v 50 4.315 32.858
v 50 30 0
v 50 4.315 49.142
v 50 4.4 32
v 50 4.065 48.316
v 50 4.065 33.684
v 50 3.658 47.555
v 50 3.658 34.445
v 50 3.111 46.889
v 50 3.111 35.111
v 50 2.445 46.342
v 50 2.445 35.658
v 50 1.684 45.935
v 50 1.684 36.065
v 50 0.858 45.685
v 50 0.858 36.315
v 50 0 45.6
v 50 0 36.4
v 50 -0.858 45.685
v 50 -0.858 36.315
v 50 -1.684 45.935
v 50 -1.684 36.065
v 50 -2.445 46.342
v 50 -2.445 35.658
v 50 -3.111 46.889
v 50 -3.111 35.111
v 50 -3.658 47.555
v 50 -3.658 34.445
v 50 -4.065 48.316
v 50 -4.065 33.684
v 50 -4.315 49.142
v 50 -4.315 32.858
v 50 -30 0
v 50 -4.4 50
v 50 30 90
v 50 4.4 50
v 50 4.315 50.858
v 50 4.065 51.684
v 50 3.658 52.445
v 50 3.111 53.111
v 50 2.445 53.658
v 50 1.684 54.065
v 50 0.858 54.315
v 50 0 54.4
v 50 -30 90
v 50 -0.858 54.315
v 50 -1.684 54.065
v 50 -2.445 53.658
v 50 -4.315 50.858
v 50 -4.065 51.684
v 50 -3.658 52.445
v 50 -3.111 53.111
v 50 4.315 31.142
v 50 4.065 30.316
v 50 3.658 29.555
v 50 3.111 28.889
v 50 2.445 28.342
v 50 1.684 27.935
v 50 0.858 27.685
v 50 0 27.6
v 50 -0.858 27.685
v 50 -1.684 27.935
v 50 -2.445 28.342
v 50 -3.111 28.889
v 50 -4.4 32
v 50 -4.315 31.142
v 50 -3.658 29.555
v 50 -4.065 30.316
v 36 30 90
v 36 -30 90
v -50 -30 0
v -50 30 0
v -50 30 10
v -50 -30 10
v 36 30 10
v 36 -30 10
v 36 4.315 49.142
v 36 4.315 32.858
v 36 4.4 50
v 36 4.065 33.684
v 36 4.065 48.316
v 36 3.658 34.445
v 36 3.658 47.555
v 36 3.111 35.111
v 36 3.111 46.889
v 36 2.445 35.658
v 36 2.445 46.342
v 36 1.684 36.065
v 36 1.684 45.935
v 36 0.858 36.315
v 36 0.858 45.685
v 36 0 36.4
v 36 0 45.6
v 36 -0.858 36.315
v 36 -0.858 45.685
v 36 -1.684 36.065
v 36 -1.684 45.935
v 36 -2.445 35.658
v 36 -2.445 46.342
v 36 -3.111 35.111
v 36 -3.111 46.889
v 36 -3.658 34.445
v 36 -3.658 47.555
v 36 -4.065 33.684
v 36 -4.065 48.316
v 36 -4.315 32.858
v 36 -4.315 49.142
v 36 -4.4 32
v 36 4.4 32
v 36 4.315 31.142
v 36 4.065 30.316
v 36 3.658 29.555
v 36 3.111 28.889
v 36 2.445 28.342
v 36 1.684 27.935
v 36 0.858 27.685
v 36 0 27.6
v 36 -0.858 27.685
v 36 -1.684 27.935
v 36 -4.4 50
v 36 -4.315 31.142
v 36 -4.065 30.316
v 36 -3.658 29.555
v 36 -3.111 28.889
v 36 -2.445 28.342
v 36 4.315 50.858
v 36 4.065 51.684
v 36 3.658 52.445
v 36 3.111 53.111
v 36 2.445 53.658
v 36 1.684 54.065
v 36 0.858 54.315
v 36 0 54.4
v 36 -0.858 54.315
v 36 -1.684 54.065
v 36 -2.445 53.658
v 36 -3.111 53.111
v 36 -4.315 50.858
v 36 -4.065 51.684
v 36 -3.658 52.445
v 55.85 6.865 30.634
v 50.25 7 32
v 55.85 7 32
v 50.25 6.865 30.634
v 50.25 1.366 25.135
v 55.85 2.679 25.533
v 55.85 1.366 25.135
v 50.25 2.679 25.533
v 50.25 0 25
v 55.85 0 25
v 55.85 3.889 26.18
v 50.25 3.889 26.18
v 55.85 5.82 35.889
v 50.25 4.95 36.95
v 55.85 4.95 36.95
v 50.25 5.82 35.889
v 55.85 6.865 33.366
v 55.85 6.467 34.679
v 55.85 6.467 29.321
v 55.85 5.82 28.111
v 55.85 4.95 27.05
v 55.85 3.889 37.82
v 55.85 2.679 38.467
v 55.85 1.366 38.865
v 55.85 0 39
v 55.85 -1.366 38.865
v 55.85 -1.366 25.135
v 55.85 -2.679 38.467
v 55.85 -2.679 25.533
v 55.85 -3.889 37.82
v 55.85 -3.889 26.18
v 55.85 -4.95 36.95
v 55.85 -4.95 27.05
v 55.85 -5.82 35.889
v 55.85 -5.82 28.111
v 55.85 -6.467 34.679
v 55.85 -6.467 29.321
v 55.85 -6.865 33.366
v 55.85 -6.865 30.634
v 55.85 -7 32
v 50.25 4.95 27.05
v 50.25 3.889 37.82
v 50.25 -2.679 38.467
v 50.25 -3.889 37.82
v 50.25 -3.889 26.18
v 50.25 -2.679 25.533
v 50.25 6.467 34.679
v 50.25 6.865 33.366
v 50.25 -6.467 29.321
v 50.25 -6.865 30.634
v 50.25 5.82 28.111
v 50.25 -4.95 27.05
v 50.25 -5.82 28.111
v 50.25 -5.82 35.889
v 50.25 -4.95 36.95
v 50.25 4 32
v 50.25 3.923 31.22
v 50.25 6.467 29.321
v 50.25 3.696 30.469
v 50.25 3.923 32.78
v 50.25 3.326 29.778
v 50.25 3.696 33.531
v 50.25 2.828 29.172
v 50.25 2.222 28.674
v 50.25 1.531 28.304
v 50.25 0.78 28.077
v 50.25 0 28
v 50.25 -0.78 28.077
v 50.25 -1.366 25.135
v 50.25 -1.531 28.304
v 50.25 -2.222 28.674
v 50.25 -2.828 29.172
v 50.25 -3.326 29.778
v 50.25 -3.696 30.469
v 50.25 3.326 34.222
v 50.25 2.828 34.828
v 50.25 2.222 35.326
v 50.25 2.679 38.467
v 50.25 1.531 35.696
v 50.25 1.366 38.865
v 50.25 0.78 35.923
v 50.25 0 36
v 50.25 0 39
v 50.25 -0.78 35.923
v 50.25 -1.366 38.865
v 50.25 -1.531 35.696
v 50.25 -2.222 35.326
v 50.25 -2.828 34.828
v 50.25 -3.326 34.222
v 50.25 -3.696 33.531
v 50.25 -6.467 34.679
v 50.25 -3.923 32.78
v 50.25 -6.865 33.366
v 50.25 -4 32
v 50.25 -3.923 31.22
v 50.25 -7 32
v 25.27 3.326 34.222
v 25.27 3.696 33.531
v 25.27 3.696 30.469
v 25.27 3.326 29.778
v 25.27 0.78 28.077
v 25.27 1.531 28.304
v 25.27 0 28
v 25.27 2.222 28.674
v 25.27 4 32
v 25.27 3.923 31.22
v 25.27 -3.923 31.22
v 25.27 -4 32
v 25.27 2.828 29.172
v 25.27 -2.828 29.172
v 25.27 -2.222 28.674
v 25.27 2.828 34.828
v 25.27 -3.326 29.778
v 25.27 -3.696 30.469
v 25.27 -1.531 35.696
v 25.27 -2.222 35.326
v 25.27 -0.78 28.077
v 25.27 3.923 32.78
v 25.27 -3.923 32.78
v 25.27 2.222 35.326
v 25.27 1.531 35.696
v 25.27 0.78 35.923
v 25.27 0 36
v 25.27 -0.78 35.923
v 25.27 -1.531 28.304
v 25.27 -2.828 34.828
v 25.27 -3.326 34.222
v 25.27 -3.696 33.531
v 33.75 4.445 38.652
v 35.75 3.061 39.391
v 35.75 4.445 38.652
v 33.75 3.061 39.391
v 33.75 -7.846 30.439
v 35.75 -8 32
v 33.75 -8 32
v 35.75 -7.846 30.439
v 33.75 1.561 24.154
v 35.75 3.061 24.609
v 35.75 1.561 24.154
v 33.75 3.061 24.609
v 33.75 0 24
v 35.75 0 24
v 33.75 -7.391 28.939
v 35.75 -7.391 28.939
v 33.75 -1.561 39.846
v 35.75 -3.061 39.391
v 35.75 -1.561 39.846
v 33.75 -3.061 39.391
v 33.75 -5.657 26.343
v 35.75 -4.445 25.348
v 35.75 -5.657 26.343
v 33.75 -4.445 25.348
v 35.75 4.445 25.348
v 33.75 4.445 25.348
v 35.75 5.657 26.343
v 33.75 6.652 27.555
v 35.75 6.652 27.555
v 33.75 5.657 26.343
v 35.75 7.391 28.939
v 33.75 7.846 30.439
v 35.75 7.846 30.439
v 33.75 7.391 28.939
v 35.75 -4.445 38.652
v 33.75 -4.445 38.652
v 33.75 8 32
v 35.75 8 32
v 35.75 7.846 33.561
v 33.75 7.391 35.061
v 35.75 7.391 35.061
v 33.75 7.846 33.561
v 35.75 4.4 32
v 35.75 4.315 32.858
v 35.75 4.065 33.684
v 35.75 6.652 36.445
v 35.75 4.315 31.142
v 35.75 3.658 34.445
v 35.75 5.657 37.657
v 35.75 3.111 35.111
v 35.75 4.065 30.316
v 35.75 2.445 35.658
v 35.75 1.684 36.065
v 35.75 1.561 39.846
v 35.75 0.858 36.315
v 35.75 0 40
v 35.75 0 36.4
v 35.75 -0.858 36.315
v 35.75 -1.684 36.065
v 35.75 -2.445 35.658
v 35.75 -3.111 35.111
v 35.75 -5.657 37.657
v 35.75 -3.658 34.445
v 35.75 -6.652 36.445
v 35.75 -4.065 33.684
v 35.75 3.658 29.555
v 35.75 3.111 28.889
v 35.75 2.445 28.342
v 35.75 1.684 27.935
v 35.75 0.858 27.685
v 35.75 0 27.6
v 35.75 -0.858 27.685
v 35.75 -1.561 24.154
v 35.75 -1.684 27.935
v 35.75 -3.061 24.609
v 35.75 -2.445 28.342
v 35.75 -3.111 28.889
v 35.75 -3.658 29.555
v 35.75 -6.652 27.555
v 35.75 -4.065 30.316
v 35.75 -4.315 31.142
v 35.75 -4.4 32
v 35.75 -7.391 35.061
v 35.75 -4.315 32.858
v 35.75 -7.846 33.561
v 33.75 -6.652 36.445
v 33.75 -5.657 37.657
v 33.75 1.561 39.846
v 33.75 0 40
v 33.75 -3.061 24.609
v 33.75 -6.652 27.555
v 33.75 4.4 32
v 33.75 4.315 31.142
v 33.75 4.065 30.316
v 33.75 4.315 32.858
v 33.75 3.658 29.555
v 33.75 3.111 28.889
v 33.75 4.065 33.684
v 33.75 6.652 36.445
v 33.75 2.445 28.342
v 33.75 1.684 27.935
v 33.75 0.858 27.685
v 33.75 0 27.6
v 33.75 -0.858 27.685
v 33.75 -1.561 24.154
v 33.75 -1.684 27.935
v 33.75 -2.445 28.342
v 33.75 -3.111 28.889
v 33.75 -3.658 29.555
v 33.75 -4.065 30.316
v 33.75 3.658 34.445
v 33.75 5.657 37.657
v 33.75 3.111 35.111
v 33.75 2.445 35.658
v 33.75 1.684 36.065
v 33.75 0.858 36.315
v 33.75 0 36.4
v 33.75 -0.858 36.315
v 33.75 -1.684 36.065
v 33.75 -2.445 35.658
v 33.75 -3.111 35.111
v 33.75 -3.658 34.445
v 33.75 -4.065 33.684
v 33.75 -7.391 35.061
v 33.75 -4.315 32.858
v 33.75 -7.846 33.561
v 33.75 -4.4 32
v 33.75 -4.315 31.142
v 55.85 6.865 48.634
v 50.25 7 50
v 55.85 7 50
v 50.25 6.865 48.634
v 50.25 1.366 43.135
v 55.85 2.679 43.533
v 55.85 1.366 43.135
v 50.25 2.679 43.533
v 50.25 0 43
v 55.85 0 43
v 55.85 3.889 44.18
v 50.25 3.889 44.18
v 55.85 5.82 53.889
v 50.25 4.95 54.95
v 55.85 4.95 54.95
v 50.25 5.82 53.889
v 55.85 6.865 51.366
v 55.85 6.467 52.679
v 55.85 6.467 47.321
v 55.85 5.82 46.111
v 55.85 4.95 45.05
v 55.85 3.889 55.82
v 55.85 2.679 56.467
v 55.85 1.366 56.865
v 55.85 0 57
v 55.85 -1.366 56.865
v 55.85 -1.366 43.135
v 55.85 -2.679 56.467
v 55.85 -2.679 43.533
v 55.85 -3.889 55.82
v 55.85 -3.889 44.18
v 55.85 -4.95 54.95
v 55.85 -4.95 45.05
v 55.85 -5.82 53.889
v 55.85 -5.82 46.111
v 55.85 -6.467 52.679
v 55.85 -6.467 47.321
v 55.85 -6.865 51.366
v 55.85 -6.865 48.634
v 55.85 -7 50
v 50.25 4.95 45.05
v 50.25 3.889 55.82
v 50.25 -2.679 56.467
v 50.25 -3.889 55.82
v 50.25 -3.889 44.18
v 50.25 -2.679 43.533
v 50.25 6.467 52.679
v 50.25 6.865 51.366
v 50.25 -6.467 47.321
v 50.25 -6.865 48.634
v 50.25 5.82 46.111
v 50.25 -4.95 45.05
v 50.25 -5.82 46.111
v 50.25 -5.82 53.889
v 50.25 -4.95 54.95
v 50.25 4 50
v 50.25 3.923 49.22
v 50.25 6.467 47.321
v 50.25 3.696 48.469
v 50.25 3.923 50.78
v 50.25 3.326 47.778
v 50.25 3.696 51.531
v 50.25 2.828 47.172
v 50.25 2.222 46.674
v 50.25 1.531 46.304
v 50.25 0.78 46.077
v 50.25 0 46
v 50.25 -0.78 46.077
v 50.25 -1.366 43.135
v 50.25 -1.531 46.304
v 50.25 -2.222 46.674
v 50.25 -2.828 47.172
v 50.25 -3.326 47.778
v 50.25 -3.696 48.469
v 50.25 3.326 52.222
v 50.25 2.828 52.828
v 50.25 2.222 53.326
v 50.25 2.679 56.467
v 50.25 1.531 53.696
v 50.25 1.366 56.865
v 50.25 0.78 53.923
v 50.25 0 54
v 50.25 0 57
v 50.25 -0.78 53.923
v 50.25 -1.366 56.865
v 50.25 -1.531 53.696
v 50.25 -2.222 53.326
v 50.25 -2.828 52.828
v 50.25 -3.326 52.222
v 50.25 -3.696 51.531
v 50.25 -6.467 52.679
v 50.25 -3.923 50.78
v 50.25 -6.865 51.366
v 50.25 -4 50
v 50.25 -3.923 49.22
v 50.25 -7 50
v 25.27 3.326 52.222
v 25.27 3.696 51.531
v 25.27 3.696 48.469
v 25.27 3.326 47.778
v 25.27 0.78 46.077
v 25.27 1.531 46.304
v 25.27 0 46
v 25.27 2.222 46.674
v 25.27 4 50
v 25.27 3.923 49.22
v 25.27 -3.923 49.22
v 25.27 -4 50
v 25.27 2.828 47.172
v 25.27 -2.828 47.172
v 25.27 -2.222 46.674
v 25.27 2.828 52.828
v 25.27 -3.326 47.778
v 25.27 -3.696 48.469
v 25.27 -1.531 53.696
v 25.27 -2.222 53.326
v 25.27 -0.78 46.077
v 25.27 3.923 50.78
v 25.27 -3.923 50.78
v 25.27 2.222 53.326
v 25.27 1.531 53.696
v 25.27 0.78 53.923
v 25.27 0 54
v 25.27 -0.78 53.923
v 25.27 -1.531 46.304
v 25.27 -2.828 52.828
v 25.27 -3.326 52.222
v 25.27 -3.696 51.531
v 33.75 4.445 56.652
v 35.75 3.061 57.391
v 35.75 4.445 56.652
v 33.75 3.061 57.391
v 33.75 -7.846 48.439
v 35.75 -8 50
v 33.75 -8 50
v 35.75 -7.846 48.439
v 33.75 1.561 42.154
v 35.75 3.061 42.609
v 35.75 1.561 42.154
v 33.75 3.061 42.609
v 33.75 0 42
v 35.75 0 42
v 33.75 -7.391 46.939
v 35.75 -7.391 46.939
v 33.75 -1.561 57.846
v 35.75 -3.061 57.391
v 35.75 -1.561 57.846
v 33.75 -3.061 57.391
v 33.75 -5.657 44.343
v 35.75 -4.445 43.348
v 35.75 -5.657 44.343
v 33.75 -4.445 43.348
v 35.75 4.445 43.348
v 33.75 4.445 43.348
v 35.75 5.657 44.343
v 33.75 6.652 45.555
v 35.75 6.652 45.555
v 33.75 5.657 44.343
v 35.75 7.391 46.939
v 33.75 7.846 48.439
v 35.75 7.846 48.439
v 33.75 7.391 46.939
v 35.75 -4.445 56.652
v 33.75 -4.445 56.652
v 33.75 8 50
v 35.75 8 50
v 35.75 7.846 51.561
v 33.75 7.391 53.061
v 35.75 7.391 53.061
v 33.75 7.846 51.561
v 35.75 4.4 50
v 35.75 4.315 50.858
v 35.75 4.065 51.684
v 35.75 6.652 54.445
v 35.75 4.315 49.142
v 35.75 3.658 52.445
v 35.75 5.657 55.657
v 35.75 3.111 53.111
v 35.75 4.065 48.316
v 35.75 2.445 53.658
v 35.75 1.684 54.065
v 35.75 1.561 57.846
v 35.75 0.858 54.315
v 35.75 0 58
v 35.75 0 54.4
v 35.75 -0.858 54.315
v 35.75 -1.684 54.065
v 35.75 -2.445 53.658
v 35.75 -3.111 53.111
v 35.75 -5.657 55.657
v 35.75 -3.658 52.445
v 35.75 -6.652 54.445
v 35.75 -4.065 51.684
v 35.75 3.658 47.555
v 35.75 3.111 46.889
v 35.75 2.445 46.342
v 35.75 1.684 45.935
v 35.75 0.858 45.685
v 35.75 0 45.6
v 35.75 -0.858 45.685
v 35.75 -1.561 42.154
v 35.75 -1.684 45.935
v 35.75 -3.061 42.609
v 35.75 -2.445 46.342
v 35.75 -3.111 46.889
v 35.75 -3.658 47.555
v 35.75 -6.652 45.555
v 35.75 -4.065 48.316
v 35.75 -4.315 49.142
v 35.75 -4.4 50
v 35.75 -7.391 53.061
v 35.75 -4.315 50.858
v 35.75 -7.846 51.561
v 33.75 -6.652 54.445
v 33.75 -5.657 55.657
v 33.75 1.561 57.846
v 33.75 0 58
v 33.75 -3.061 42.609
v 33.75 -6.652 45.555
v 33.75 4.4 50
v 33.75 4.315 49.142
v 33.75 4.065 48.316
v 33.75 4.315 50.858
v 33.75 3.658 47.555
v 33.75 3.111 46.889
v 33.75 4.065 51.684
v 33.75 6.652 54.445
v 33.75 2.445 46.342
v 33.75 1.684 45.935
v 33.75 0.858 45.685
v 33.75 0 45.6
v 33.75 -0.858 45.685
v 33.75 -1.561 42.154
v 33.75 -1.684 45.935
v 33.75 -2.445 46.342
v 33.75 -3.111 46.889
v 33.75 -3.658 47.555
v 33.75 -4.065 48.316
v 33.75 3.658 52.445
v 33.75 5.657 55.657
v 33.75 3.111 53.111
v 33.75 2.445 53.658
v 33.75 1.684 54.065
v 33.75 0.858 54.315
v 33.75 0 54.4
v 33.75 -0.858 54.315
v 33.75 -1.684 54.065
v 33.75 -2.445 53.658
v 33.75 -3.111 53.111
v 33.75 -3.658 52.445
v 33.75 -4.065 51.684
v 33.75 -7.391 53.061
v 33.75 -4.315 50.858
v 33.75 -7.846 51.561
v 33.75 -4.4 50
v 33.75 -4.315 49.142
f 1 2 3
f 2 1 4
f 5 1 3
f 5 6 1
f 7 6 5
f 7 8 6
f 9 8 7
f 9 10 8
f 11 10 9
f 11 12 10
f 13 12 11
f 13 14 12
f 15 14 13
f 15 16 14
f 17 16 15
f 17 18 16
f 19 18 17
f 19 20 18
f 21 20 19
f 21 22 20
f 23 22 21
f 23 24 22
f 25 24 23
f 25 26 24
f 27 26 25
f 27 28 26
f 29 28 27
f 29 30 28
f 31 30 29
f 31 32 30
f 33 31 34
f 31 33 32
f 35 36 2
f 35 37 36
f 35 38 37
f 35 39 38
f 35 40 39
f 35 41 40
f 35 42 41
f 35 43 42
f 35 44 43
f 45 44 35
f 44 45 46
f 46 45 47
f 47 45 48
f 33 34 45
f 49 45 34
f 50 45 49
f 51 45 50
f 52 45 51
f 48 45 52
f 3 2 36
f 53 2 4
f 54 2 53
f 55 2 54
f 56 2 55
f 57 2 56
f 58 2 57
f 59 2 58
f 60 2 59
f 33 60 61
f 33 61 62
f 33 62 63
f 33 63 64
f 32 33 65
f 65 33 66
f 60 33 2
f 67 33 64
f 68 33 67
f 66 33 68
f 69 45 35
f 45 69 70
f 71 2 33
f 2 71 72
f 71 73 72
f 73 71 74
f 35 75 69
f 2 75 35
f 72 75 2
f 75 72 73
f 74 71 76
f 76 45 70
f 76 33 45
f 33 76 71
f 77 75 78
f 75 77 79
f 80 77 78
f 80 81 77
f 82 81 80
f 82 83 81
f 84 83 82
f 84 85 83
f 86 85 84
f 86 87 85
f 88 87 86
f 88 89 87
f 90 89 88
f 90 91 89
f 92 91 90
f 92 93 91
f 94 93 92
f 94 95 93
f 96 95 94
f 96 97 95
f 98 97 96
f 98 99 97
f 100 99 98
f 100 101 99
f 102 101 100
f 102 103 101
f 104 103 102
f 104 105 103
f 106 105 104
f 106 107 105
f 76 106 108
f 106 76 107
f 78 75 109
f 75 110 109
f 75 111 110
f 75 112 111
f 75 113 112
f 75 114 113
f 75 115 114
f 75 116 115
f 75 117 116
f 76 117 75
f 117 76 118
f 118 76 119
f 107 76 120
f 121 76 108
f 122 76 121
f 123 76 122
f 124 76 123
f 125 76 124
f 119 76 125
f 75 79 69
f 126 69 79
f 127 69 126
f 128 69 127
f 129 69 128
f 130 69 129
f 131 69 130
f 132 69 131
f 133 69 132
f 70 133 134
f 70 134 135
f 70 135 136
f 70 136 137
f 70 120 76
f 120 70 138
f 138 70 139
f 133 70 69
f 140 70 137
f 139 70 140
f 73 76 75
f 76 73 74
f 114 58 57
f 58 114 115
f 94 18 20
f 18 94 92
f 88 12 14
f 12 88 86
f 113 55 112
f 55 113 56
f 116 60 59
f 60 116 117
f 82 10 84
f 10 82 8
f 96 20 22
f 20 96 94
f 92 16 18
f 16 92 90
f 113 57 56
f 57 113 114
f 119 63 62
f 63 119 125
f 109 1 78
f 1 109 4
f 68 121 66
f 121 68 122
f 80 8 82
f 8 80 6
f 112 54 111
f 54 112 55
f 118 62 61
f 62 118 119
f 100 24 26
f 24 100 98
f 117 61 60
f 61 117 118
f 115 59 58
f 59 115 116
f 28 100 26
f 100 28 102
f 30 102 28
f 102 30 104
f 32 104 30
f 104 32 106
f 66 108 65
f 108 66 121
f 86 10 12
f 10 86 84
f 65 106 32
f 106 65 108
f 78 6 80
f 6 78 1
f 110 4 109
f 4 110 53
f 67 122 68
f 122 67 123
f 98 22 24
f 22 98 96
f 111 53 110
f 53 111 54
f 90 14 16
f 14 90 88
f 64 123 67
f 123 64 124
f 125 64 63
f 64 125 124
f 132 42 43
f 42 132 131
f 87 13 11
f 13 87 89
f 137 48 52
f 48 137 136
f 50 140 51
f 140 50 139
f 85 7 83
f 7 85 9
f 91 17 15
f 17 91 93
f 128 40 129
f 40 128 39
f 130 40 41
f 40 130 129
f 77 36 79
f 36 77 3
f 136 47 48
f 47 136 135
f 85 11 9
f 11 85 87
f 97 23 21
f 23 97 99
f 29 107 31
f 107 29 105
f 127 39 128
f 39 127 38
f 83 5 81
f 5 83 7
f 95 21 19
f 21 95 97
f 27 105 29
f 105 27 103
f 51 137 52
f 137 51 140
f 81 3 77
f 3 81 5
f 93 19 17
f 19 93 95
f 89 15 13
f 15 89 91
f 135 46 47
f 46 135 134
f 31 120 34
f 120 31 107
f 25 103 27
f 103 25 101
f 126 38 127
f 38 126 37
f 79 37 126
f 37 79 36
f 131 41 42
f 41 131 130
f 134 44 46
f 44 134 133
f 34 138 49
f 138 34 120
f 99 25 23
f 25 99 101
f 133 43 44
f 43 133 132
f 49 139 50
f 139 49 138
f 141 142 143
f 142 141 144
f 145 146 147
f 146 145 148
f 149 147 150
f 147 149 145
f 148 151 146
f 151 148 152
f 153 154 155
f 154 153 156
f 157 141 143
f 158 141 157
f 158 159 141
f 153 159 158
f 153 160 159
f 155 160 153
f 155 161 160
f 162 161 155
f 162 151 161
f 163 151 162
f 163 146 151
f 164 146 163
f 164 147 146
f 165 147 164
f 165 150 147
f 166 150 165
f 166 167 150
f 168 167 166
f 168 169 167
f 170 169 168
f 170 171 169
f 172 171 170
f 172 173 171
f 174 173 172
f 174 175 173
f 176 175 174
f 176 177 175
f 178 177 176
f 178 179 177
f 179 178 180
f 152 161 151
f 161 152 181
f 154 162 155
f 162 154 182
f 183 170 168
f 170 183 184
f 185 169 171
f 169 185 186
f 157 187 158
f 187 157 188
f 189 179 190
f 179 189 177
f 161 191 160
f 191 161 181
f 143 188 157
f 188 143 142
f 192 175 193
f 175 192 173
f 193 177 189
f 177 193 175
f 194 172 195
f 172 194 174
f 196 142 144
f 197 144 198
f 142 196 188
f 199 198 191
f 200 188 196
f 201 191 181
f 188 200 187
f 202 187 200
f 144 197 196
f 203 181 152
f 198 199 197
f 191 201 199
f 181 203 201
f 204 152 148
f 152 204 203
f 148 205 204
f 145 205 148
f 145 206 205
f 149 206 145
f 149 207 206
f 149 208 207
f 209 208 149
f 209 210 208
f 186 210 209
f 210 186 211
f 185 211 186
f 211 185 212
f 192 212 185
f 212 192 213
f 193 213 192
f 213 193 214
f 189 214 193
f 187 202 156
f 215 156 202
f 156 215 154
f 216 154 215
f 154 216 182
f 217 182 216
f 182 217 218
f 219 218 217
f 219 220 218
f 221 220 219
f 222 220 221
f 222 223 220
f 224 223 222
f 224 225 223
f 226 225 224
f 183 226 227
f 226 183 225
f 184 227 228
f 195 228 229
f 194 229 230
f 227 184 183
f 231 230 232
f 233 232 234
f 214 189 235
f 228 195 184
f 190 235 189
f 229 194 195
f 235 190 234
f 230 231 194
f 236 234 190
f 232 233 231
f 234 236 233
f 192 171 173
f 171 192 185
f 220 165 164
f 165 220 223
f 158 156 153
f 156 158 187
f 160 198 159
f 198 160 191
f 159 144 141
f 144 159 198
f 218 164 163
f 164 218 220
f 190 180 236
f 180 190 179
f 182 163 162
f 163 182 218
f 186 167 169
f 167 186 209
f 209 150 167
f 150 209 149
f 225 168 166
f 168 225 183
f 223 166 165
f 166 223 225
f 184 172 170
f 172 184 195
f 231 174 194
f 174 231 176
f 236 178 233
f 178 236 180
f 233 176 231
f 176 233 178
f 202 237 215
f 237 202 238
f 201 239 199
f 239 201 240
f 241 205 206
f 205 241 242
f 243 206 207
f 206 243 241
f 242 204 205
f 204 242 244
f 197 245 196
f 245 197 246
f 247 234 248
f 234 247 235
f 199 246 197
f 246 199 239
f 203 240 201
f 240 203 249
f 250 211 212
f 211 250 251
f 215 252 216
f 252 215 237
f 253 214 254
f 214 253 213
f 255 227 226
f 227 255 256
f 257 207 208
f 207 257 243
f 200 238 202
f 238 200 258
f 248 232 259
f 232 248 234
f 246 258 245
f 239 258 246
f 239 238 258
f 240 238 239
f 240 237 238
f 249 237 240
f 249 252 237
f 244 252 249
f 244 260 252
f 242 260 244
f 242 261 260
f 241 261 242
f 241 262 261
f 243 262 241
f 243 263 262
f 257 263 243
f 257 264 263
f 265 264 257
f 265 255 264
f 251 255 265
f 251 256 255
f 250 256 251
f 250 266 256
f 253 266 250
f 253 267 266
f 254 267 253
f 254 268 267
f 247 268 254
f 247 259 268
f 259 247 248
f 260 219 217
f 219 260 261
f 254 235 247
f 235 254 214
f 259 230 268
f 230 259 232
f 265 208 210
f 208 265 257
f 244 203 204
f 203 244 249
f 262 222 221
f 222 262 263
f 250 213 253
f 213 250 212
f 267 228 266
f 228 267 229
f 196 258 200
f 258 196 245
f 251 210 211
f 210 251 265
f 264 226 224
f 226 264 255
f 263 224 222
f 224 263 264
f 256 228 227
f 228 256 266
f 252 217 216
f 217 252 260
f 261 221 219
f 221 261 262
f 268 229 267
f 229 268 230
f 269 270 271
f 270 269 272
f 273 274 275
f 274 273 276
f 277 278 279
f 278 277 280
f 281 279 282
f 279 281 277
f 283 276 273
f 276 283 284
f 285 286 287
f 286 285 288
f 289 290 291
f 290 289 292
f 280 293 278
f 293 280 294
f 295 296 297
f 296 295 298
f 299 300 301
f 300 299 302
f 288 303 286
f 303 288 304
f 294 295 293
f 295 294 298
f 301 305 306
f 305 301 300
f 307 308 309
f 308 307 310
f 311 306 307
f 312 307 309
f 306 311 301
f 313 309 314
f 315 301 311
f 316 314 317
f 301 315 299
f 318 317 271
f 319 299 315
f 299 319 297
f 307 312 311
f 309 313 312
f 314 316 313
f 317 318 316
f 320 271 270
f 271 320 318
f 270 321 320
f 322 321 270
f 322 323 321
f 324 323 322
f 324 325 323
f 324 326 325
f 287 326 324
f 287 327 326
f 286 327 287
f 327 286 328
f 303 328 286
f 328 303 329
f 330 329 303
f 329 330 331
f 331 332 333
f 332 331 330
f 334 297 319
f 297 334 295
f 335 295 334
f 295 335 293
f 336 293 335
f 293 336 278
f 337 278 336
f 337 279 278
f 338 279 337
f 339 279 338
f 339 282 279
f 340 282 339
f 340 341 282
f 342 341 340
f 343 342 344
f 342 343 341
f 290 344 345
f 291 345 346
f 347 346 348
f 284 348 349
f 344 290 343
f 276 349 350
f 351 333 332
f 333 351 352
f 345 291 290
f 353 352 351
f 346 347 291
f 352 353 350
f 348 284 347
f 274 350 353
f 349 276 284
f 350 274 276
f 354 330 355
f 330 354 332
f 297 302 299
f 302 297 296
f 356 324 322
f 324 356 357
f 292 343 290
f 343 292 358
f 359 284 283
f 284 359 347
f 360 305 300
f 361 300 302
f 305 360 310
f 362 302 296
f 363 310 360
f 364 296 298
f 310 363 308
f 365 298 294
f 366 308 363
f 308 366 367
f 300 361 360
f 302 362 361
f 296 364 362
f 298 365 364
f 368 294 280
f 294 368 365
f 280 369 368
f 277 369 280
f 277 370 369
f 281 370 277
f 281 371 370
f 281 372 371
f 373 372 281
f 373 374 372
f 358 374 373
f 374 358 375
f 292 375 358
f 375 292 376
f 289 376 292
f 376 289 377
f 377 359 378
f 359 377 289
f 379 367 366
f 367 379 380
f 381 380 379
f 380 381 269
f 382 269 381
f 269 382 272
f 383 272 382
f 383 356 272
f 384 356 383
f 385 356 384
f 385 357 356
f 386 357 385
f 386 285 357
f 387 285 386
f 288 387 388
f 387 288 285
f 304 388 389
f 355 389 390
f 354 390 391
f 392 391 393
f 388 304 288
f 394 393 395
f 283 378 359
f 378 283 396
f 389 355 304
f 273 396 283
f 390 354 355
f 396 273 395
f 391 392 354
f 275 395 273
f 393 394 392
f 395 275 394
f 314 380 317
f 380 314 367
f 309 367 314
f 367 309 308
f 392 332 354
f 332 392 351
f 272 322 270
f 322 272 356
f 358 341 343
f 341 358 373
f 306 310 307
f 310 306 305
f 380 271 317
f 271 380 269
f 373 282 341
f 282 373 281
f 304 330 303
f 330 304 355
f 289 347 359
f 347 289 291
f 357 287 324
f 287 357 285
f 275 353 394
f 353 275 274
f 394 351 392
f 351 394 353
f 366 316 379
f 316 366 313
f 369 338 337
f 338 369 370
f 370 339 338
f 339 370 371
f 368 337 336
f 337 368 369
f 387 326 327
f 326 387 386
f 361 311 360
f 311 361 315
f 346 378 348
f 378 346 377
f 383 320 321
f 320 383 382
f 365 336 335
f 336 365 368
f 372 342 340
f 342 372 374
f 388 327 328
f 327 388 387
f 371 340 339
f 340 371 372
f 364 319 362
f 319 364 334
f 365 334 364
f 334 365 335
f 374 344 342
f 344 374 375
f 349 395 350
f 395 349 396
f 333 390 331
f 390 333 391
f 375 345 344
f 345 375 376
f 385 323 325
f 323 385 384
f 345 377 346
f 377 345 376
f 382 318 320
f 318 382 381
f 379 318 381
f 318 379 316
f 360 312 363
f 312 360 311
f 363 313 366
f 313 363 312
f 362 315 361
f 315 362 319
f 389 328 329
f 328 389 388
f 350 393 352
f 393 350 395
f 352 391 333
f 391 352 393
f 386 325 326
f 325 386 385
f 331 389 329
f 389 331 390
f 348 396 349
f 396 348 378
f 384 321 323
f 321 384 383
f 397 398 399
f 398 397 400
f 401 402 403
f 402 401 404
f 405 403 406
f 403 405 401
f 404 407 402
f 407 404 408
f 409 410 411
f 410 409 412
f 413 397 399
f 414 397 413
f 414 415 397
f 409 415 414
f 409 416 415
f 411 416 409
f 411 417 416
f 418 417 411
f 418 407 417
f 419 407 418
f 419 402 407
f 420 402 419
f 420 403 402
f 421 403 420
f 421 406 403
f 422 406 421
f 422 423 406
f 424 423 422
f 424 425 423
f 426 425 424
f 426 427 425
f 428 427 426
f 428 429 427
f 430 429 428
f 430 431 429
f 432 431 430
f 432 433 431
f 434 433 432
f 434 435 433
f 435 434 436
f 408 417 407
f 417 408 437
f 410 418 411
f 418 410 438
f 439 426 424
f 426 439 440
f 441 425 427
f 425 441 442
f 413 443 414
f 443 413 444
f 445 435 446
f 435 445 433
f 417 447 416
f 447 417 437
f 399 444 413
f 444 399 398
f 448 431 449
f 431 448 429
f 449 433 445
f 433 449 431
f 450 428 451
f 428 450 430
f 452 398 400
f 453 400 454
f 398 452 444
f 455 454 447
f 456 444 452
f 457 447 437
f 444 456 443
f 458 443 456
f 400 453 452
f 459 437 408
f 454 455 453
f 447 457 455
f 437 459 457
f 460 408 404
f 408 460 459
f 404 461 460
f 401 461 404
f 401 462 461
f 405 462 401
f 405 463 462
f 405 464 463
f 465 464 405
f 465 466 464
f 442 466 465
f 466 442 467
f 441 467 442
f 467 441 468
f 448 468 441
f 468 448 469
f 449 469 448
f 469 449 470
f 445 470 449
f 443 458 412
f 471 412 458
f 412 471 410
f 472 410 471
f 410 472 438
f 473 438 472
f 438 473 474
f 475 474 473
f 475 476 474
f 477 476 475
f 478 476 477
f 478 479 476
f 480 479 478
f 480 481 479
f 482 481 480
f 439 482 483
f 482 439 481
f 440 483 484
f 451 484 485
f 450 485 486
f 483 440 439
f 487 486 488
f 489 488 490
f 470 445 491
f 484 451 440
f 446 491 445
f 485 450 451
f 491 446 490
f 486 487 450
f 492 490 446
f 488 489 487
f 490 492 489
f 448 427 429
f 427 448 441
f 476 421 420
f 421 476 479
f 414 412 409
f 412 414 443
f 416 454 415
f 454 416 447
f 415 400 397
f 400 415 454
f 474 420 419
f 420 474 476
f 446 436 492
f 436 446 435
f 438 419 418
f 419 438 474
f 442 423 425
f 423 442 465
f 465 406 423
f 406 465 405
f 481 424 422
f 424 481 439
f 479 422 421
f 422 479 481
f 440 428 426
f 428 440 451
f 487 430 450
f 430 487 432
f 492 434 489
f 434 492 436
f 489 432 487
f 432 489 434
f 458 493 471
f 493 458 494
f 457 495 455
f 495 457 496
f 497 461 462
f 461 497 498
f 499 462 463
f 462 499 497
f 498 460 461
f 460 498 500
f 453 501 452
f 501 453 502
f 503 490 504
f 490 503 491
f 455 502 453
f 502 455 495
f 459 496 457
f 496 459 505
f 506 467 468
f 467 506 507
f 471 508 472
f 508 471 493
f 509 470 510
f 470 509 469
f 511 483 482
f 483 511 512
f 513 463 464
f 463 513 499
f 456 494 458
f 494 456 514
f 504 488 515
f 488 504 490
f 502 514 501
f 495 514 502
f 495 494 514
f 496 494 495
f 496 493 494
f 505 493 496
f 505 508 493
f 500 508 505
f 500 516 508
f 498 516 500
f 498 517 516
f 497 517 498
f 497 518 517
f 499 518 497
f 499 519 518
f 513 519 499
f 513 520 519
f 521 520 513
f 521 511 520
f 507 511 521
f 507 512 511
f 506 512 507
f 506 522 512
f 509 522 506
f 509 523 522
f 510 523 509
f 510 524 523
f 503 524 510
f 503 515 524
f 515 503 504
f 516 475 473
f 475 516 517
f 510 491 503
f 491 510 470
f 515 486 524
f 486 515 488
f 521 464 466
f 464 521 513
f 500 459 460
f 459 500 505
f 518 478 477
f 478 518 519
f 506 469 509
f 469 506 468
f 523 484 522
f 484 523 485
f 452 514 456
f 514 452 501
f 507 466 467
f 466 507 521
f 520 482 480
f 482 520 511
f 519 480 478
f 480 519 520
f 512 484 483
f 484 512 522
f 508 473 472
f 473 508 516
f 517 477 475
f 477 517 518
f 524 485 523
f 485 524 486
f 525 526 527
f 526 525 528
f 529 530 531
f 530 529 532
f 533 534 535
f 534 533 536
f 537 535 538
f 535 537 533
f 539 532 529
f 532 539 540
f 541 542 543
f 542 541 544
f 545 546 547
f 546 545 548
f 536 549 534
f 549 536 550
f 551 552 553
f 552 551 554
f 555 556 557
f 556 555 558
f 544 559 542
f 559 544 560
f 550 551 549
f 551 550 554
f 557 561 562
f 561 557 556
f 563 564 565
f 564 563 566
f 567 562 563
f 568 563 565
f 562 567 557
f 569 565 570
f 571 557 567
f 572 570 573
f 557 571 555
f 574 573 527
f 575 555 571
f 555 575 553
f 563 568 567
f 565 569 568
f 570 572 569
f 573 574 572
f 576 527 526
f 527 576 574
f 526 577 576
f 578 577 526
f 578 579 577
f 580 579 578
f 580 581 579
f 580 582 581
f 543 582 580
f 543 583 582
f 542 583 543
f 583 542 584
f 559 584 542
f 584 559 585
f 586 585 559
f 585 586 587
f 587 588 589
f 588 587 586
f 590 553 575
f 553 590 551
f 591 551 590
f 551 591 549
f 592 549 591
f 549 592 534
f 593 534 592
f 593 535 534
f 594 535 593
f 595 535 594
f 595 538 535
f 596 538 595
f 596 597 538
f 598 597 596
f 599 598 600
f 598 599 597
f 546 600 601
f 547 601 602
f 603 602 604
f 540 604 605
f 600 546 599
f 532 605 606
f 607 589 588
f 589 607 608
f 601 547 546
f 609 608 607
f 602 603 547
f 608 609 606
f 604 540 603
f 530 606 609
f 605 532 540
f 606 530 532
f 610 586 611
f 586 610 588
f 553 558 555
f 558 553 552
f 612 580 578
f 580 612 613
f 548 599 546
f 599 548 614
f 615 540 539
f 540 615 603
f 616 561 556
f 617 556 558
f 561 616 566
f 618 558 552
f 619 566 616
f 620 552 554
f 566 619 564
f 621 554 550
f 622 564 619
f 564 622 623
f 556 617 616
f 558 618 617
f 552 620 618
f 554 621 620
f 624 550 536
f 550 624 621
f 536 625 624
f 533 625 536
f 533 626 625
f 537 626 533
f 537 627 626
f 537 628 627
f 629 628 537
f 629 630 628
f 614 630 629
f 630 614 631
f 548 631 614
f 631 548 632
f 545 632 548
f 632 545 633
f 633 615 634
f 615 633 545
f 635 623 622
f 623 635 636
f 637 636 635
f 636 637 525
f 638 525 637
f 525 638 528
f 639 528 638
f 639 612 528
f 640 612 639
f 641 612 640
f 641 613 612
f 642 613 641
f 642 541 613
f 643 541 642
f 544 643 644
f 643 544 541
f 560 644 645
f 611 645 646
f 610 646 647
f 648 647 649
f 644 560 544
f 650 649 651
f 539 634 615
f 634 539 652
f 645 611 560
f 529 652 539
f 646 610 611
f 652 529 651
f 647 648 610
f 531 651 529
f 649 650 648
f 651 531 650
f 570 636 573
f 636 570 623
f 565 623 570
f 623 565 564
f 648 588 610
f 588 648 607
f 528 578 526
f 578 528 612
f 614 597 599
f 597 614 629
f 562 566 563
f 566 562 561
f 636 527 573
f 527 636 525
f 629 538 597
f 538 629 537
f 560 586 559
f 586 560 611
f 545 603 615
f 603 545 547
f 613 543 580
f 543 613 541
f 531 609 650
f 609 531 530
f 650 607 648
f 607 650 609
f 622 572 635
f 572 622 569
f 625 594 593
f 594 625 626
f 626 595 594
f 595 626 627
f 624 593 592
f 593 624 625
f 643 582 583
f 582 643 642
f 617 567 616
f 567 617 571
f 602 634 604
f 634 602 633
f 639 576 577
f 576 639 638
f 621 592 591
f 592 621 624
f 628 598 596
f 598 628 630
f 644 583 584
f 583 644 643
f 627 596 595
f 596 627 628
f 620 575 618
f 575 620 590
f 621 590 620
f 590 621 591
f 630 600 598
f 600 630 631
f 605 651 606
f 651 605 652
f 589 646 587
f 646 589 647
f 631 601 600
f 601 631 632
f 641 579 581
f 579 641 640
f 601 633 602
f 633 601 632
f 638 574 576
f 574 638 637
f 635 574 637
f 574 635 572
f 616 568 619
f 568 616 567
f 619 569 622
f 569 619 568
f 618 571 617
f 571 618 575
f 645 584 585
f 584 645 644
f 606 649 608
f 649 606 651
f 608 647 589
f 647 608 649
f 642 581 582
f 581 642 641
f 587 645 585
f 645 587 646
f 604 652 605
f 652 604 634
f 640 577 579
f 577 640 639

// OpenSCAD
$fn = 32;

// ------------------------------------------------------------------------
// Bolted bracket: 100 x 60 mm bracket with 2 bolt joints
// Every part is its own module, assembly() places them once.
// ------------------------------------------------------------------------

// --- part 1 ---
module bracket() {
  difference() {
    translate([-50, -30, 0]) cube([100, 60, 90]);
    translate([-51, -31, 10]) cube([87, 62, 81]);
    translate([43, 0, 32]) rotate([0, 90, 0]) cylinder(h = 16, d = 8.8, center = true);
    translate([43, 0, 50]) rotate([0, 90, 0]) cylinder(h = 16, d = 8.8, center = true);
  }
}

// --- part 2 ---
module bolt1() {
  cylinder(h = 5.6, d = 14);
  translate([0, 0, -24.98]) cylinder(h = 24.98, d = 8);
}

// --- part 3 ---
module washer1() {
  difference() {
      translate([0, 0, 0]) cylinder(h = 2, d = 16);
      translate([0, 0, -1]) cylinder(h = 4, d = 8.8);
    }
}

// --- part 4 ---
module bolt2() {
  cylinder(h = 5.6, d = 14);
  translate([0, 0, -24.98]) cylinder(h = 24.98, d = 8);
}

// --- part 5 ---
module washer2() {
  difference() {
      translate([0, 0, 0]) cylinder(h = 2, d = 16);
      translate([0, 0, -1]) cylinder(h = 4, d = 8.8);
    }
}

// --- assembly ---
module assembly() {
  translate([0, 0, 0]) rotate([0, 0, 0]) bracket();
  translate([50.25, 0, 32]) rotate([0, 90, 0]) bolt1();
  translate([33.75, 0, 32]) rotate([0, 90, 0]) washer1();
  translate([50.25, 0, 50]) rotate([0, 90, 0]) bolt2();
  translate([33.75, 0, 50]) rotate([0, 90, 0]) washer2();
}

assembly();
